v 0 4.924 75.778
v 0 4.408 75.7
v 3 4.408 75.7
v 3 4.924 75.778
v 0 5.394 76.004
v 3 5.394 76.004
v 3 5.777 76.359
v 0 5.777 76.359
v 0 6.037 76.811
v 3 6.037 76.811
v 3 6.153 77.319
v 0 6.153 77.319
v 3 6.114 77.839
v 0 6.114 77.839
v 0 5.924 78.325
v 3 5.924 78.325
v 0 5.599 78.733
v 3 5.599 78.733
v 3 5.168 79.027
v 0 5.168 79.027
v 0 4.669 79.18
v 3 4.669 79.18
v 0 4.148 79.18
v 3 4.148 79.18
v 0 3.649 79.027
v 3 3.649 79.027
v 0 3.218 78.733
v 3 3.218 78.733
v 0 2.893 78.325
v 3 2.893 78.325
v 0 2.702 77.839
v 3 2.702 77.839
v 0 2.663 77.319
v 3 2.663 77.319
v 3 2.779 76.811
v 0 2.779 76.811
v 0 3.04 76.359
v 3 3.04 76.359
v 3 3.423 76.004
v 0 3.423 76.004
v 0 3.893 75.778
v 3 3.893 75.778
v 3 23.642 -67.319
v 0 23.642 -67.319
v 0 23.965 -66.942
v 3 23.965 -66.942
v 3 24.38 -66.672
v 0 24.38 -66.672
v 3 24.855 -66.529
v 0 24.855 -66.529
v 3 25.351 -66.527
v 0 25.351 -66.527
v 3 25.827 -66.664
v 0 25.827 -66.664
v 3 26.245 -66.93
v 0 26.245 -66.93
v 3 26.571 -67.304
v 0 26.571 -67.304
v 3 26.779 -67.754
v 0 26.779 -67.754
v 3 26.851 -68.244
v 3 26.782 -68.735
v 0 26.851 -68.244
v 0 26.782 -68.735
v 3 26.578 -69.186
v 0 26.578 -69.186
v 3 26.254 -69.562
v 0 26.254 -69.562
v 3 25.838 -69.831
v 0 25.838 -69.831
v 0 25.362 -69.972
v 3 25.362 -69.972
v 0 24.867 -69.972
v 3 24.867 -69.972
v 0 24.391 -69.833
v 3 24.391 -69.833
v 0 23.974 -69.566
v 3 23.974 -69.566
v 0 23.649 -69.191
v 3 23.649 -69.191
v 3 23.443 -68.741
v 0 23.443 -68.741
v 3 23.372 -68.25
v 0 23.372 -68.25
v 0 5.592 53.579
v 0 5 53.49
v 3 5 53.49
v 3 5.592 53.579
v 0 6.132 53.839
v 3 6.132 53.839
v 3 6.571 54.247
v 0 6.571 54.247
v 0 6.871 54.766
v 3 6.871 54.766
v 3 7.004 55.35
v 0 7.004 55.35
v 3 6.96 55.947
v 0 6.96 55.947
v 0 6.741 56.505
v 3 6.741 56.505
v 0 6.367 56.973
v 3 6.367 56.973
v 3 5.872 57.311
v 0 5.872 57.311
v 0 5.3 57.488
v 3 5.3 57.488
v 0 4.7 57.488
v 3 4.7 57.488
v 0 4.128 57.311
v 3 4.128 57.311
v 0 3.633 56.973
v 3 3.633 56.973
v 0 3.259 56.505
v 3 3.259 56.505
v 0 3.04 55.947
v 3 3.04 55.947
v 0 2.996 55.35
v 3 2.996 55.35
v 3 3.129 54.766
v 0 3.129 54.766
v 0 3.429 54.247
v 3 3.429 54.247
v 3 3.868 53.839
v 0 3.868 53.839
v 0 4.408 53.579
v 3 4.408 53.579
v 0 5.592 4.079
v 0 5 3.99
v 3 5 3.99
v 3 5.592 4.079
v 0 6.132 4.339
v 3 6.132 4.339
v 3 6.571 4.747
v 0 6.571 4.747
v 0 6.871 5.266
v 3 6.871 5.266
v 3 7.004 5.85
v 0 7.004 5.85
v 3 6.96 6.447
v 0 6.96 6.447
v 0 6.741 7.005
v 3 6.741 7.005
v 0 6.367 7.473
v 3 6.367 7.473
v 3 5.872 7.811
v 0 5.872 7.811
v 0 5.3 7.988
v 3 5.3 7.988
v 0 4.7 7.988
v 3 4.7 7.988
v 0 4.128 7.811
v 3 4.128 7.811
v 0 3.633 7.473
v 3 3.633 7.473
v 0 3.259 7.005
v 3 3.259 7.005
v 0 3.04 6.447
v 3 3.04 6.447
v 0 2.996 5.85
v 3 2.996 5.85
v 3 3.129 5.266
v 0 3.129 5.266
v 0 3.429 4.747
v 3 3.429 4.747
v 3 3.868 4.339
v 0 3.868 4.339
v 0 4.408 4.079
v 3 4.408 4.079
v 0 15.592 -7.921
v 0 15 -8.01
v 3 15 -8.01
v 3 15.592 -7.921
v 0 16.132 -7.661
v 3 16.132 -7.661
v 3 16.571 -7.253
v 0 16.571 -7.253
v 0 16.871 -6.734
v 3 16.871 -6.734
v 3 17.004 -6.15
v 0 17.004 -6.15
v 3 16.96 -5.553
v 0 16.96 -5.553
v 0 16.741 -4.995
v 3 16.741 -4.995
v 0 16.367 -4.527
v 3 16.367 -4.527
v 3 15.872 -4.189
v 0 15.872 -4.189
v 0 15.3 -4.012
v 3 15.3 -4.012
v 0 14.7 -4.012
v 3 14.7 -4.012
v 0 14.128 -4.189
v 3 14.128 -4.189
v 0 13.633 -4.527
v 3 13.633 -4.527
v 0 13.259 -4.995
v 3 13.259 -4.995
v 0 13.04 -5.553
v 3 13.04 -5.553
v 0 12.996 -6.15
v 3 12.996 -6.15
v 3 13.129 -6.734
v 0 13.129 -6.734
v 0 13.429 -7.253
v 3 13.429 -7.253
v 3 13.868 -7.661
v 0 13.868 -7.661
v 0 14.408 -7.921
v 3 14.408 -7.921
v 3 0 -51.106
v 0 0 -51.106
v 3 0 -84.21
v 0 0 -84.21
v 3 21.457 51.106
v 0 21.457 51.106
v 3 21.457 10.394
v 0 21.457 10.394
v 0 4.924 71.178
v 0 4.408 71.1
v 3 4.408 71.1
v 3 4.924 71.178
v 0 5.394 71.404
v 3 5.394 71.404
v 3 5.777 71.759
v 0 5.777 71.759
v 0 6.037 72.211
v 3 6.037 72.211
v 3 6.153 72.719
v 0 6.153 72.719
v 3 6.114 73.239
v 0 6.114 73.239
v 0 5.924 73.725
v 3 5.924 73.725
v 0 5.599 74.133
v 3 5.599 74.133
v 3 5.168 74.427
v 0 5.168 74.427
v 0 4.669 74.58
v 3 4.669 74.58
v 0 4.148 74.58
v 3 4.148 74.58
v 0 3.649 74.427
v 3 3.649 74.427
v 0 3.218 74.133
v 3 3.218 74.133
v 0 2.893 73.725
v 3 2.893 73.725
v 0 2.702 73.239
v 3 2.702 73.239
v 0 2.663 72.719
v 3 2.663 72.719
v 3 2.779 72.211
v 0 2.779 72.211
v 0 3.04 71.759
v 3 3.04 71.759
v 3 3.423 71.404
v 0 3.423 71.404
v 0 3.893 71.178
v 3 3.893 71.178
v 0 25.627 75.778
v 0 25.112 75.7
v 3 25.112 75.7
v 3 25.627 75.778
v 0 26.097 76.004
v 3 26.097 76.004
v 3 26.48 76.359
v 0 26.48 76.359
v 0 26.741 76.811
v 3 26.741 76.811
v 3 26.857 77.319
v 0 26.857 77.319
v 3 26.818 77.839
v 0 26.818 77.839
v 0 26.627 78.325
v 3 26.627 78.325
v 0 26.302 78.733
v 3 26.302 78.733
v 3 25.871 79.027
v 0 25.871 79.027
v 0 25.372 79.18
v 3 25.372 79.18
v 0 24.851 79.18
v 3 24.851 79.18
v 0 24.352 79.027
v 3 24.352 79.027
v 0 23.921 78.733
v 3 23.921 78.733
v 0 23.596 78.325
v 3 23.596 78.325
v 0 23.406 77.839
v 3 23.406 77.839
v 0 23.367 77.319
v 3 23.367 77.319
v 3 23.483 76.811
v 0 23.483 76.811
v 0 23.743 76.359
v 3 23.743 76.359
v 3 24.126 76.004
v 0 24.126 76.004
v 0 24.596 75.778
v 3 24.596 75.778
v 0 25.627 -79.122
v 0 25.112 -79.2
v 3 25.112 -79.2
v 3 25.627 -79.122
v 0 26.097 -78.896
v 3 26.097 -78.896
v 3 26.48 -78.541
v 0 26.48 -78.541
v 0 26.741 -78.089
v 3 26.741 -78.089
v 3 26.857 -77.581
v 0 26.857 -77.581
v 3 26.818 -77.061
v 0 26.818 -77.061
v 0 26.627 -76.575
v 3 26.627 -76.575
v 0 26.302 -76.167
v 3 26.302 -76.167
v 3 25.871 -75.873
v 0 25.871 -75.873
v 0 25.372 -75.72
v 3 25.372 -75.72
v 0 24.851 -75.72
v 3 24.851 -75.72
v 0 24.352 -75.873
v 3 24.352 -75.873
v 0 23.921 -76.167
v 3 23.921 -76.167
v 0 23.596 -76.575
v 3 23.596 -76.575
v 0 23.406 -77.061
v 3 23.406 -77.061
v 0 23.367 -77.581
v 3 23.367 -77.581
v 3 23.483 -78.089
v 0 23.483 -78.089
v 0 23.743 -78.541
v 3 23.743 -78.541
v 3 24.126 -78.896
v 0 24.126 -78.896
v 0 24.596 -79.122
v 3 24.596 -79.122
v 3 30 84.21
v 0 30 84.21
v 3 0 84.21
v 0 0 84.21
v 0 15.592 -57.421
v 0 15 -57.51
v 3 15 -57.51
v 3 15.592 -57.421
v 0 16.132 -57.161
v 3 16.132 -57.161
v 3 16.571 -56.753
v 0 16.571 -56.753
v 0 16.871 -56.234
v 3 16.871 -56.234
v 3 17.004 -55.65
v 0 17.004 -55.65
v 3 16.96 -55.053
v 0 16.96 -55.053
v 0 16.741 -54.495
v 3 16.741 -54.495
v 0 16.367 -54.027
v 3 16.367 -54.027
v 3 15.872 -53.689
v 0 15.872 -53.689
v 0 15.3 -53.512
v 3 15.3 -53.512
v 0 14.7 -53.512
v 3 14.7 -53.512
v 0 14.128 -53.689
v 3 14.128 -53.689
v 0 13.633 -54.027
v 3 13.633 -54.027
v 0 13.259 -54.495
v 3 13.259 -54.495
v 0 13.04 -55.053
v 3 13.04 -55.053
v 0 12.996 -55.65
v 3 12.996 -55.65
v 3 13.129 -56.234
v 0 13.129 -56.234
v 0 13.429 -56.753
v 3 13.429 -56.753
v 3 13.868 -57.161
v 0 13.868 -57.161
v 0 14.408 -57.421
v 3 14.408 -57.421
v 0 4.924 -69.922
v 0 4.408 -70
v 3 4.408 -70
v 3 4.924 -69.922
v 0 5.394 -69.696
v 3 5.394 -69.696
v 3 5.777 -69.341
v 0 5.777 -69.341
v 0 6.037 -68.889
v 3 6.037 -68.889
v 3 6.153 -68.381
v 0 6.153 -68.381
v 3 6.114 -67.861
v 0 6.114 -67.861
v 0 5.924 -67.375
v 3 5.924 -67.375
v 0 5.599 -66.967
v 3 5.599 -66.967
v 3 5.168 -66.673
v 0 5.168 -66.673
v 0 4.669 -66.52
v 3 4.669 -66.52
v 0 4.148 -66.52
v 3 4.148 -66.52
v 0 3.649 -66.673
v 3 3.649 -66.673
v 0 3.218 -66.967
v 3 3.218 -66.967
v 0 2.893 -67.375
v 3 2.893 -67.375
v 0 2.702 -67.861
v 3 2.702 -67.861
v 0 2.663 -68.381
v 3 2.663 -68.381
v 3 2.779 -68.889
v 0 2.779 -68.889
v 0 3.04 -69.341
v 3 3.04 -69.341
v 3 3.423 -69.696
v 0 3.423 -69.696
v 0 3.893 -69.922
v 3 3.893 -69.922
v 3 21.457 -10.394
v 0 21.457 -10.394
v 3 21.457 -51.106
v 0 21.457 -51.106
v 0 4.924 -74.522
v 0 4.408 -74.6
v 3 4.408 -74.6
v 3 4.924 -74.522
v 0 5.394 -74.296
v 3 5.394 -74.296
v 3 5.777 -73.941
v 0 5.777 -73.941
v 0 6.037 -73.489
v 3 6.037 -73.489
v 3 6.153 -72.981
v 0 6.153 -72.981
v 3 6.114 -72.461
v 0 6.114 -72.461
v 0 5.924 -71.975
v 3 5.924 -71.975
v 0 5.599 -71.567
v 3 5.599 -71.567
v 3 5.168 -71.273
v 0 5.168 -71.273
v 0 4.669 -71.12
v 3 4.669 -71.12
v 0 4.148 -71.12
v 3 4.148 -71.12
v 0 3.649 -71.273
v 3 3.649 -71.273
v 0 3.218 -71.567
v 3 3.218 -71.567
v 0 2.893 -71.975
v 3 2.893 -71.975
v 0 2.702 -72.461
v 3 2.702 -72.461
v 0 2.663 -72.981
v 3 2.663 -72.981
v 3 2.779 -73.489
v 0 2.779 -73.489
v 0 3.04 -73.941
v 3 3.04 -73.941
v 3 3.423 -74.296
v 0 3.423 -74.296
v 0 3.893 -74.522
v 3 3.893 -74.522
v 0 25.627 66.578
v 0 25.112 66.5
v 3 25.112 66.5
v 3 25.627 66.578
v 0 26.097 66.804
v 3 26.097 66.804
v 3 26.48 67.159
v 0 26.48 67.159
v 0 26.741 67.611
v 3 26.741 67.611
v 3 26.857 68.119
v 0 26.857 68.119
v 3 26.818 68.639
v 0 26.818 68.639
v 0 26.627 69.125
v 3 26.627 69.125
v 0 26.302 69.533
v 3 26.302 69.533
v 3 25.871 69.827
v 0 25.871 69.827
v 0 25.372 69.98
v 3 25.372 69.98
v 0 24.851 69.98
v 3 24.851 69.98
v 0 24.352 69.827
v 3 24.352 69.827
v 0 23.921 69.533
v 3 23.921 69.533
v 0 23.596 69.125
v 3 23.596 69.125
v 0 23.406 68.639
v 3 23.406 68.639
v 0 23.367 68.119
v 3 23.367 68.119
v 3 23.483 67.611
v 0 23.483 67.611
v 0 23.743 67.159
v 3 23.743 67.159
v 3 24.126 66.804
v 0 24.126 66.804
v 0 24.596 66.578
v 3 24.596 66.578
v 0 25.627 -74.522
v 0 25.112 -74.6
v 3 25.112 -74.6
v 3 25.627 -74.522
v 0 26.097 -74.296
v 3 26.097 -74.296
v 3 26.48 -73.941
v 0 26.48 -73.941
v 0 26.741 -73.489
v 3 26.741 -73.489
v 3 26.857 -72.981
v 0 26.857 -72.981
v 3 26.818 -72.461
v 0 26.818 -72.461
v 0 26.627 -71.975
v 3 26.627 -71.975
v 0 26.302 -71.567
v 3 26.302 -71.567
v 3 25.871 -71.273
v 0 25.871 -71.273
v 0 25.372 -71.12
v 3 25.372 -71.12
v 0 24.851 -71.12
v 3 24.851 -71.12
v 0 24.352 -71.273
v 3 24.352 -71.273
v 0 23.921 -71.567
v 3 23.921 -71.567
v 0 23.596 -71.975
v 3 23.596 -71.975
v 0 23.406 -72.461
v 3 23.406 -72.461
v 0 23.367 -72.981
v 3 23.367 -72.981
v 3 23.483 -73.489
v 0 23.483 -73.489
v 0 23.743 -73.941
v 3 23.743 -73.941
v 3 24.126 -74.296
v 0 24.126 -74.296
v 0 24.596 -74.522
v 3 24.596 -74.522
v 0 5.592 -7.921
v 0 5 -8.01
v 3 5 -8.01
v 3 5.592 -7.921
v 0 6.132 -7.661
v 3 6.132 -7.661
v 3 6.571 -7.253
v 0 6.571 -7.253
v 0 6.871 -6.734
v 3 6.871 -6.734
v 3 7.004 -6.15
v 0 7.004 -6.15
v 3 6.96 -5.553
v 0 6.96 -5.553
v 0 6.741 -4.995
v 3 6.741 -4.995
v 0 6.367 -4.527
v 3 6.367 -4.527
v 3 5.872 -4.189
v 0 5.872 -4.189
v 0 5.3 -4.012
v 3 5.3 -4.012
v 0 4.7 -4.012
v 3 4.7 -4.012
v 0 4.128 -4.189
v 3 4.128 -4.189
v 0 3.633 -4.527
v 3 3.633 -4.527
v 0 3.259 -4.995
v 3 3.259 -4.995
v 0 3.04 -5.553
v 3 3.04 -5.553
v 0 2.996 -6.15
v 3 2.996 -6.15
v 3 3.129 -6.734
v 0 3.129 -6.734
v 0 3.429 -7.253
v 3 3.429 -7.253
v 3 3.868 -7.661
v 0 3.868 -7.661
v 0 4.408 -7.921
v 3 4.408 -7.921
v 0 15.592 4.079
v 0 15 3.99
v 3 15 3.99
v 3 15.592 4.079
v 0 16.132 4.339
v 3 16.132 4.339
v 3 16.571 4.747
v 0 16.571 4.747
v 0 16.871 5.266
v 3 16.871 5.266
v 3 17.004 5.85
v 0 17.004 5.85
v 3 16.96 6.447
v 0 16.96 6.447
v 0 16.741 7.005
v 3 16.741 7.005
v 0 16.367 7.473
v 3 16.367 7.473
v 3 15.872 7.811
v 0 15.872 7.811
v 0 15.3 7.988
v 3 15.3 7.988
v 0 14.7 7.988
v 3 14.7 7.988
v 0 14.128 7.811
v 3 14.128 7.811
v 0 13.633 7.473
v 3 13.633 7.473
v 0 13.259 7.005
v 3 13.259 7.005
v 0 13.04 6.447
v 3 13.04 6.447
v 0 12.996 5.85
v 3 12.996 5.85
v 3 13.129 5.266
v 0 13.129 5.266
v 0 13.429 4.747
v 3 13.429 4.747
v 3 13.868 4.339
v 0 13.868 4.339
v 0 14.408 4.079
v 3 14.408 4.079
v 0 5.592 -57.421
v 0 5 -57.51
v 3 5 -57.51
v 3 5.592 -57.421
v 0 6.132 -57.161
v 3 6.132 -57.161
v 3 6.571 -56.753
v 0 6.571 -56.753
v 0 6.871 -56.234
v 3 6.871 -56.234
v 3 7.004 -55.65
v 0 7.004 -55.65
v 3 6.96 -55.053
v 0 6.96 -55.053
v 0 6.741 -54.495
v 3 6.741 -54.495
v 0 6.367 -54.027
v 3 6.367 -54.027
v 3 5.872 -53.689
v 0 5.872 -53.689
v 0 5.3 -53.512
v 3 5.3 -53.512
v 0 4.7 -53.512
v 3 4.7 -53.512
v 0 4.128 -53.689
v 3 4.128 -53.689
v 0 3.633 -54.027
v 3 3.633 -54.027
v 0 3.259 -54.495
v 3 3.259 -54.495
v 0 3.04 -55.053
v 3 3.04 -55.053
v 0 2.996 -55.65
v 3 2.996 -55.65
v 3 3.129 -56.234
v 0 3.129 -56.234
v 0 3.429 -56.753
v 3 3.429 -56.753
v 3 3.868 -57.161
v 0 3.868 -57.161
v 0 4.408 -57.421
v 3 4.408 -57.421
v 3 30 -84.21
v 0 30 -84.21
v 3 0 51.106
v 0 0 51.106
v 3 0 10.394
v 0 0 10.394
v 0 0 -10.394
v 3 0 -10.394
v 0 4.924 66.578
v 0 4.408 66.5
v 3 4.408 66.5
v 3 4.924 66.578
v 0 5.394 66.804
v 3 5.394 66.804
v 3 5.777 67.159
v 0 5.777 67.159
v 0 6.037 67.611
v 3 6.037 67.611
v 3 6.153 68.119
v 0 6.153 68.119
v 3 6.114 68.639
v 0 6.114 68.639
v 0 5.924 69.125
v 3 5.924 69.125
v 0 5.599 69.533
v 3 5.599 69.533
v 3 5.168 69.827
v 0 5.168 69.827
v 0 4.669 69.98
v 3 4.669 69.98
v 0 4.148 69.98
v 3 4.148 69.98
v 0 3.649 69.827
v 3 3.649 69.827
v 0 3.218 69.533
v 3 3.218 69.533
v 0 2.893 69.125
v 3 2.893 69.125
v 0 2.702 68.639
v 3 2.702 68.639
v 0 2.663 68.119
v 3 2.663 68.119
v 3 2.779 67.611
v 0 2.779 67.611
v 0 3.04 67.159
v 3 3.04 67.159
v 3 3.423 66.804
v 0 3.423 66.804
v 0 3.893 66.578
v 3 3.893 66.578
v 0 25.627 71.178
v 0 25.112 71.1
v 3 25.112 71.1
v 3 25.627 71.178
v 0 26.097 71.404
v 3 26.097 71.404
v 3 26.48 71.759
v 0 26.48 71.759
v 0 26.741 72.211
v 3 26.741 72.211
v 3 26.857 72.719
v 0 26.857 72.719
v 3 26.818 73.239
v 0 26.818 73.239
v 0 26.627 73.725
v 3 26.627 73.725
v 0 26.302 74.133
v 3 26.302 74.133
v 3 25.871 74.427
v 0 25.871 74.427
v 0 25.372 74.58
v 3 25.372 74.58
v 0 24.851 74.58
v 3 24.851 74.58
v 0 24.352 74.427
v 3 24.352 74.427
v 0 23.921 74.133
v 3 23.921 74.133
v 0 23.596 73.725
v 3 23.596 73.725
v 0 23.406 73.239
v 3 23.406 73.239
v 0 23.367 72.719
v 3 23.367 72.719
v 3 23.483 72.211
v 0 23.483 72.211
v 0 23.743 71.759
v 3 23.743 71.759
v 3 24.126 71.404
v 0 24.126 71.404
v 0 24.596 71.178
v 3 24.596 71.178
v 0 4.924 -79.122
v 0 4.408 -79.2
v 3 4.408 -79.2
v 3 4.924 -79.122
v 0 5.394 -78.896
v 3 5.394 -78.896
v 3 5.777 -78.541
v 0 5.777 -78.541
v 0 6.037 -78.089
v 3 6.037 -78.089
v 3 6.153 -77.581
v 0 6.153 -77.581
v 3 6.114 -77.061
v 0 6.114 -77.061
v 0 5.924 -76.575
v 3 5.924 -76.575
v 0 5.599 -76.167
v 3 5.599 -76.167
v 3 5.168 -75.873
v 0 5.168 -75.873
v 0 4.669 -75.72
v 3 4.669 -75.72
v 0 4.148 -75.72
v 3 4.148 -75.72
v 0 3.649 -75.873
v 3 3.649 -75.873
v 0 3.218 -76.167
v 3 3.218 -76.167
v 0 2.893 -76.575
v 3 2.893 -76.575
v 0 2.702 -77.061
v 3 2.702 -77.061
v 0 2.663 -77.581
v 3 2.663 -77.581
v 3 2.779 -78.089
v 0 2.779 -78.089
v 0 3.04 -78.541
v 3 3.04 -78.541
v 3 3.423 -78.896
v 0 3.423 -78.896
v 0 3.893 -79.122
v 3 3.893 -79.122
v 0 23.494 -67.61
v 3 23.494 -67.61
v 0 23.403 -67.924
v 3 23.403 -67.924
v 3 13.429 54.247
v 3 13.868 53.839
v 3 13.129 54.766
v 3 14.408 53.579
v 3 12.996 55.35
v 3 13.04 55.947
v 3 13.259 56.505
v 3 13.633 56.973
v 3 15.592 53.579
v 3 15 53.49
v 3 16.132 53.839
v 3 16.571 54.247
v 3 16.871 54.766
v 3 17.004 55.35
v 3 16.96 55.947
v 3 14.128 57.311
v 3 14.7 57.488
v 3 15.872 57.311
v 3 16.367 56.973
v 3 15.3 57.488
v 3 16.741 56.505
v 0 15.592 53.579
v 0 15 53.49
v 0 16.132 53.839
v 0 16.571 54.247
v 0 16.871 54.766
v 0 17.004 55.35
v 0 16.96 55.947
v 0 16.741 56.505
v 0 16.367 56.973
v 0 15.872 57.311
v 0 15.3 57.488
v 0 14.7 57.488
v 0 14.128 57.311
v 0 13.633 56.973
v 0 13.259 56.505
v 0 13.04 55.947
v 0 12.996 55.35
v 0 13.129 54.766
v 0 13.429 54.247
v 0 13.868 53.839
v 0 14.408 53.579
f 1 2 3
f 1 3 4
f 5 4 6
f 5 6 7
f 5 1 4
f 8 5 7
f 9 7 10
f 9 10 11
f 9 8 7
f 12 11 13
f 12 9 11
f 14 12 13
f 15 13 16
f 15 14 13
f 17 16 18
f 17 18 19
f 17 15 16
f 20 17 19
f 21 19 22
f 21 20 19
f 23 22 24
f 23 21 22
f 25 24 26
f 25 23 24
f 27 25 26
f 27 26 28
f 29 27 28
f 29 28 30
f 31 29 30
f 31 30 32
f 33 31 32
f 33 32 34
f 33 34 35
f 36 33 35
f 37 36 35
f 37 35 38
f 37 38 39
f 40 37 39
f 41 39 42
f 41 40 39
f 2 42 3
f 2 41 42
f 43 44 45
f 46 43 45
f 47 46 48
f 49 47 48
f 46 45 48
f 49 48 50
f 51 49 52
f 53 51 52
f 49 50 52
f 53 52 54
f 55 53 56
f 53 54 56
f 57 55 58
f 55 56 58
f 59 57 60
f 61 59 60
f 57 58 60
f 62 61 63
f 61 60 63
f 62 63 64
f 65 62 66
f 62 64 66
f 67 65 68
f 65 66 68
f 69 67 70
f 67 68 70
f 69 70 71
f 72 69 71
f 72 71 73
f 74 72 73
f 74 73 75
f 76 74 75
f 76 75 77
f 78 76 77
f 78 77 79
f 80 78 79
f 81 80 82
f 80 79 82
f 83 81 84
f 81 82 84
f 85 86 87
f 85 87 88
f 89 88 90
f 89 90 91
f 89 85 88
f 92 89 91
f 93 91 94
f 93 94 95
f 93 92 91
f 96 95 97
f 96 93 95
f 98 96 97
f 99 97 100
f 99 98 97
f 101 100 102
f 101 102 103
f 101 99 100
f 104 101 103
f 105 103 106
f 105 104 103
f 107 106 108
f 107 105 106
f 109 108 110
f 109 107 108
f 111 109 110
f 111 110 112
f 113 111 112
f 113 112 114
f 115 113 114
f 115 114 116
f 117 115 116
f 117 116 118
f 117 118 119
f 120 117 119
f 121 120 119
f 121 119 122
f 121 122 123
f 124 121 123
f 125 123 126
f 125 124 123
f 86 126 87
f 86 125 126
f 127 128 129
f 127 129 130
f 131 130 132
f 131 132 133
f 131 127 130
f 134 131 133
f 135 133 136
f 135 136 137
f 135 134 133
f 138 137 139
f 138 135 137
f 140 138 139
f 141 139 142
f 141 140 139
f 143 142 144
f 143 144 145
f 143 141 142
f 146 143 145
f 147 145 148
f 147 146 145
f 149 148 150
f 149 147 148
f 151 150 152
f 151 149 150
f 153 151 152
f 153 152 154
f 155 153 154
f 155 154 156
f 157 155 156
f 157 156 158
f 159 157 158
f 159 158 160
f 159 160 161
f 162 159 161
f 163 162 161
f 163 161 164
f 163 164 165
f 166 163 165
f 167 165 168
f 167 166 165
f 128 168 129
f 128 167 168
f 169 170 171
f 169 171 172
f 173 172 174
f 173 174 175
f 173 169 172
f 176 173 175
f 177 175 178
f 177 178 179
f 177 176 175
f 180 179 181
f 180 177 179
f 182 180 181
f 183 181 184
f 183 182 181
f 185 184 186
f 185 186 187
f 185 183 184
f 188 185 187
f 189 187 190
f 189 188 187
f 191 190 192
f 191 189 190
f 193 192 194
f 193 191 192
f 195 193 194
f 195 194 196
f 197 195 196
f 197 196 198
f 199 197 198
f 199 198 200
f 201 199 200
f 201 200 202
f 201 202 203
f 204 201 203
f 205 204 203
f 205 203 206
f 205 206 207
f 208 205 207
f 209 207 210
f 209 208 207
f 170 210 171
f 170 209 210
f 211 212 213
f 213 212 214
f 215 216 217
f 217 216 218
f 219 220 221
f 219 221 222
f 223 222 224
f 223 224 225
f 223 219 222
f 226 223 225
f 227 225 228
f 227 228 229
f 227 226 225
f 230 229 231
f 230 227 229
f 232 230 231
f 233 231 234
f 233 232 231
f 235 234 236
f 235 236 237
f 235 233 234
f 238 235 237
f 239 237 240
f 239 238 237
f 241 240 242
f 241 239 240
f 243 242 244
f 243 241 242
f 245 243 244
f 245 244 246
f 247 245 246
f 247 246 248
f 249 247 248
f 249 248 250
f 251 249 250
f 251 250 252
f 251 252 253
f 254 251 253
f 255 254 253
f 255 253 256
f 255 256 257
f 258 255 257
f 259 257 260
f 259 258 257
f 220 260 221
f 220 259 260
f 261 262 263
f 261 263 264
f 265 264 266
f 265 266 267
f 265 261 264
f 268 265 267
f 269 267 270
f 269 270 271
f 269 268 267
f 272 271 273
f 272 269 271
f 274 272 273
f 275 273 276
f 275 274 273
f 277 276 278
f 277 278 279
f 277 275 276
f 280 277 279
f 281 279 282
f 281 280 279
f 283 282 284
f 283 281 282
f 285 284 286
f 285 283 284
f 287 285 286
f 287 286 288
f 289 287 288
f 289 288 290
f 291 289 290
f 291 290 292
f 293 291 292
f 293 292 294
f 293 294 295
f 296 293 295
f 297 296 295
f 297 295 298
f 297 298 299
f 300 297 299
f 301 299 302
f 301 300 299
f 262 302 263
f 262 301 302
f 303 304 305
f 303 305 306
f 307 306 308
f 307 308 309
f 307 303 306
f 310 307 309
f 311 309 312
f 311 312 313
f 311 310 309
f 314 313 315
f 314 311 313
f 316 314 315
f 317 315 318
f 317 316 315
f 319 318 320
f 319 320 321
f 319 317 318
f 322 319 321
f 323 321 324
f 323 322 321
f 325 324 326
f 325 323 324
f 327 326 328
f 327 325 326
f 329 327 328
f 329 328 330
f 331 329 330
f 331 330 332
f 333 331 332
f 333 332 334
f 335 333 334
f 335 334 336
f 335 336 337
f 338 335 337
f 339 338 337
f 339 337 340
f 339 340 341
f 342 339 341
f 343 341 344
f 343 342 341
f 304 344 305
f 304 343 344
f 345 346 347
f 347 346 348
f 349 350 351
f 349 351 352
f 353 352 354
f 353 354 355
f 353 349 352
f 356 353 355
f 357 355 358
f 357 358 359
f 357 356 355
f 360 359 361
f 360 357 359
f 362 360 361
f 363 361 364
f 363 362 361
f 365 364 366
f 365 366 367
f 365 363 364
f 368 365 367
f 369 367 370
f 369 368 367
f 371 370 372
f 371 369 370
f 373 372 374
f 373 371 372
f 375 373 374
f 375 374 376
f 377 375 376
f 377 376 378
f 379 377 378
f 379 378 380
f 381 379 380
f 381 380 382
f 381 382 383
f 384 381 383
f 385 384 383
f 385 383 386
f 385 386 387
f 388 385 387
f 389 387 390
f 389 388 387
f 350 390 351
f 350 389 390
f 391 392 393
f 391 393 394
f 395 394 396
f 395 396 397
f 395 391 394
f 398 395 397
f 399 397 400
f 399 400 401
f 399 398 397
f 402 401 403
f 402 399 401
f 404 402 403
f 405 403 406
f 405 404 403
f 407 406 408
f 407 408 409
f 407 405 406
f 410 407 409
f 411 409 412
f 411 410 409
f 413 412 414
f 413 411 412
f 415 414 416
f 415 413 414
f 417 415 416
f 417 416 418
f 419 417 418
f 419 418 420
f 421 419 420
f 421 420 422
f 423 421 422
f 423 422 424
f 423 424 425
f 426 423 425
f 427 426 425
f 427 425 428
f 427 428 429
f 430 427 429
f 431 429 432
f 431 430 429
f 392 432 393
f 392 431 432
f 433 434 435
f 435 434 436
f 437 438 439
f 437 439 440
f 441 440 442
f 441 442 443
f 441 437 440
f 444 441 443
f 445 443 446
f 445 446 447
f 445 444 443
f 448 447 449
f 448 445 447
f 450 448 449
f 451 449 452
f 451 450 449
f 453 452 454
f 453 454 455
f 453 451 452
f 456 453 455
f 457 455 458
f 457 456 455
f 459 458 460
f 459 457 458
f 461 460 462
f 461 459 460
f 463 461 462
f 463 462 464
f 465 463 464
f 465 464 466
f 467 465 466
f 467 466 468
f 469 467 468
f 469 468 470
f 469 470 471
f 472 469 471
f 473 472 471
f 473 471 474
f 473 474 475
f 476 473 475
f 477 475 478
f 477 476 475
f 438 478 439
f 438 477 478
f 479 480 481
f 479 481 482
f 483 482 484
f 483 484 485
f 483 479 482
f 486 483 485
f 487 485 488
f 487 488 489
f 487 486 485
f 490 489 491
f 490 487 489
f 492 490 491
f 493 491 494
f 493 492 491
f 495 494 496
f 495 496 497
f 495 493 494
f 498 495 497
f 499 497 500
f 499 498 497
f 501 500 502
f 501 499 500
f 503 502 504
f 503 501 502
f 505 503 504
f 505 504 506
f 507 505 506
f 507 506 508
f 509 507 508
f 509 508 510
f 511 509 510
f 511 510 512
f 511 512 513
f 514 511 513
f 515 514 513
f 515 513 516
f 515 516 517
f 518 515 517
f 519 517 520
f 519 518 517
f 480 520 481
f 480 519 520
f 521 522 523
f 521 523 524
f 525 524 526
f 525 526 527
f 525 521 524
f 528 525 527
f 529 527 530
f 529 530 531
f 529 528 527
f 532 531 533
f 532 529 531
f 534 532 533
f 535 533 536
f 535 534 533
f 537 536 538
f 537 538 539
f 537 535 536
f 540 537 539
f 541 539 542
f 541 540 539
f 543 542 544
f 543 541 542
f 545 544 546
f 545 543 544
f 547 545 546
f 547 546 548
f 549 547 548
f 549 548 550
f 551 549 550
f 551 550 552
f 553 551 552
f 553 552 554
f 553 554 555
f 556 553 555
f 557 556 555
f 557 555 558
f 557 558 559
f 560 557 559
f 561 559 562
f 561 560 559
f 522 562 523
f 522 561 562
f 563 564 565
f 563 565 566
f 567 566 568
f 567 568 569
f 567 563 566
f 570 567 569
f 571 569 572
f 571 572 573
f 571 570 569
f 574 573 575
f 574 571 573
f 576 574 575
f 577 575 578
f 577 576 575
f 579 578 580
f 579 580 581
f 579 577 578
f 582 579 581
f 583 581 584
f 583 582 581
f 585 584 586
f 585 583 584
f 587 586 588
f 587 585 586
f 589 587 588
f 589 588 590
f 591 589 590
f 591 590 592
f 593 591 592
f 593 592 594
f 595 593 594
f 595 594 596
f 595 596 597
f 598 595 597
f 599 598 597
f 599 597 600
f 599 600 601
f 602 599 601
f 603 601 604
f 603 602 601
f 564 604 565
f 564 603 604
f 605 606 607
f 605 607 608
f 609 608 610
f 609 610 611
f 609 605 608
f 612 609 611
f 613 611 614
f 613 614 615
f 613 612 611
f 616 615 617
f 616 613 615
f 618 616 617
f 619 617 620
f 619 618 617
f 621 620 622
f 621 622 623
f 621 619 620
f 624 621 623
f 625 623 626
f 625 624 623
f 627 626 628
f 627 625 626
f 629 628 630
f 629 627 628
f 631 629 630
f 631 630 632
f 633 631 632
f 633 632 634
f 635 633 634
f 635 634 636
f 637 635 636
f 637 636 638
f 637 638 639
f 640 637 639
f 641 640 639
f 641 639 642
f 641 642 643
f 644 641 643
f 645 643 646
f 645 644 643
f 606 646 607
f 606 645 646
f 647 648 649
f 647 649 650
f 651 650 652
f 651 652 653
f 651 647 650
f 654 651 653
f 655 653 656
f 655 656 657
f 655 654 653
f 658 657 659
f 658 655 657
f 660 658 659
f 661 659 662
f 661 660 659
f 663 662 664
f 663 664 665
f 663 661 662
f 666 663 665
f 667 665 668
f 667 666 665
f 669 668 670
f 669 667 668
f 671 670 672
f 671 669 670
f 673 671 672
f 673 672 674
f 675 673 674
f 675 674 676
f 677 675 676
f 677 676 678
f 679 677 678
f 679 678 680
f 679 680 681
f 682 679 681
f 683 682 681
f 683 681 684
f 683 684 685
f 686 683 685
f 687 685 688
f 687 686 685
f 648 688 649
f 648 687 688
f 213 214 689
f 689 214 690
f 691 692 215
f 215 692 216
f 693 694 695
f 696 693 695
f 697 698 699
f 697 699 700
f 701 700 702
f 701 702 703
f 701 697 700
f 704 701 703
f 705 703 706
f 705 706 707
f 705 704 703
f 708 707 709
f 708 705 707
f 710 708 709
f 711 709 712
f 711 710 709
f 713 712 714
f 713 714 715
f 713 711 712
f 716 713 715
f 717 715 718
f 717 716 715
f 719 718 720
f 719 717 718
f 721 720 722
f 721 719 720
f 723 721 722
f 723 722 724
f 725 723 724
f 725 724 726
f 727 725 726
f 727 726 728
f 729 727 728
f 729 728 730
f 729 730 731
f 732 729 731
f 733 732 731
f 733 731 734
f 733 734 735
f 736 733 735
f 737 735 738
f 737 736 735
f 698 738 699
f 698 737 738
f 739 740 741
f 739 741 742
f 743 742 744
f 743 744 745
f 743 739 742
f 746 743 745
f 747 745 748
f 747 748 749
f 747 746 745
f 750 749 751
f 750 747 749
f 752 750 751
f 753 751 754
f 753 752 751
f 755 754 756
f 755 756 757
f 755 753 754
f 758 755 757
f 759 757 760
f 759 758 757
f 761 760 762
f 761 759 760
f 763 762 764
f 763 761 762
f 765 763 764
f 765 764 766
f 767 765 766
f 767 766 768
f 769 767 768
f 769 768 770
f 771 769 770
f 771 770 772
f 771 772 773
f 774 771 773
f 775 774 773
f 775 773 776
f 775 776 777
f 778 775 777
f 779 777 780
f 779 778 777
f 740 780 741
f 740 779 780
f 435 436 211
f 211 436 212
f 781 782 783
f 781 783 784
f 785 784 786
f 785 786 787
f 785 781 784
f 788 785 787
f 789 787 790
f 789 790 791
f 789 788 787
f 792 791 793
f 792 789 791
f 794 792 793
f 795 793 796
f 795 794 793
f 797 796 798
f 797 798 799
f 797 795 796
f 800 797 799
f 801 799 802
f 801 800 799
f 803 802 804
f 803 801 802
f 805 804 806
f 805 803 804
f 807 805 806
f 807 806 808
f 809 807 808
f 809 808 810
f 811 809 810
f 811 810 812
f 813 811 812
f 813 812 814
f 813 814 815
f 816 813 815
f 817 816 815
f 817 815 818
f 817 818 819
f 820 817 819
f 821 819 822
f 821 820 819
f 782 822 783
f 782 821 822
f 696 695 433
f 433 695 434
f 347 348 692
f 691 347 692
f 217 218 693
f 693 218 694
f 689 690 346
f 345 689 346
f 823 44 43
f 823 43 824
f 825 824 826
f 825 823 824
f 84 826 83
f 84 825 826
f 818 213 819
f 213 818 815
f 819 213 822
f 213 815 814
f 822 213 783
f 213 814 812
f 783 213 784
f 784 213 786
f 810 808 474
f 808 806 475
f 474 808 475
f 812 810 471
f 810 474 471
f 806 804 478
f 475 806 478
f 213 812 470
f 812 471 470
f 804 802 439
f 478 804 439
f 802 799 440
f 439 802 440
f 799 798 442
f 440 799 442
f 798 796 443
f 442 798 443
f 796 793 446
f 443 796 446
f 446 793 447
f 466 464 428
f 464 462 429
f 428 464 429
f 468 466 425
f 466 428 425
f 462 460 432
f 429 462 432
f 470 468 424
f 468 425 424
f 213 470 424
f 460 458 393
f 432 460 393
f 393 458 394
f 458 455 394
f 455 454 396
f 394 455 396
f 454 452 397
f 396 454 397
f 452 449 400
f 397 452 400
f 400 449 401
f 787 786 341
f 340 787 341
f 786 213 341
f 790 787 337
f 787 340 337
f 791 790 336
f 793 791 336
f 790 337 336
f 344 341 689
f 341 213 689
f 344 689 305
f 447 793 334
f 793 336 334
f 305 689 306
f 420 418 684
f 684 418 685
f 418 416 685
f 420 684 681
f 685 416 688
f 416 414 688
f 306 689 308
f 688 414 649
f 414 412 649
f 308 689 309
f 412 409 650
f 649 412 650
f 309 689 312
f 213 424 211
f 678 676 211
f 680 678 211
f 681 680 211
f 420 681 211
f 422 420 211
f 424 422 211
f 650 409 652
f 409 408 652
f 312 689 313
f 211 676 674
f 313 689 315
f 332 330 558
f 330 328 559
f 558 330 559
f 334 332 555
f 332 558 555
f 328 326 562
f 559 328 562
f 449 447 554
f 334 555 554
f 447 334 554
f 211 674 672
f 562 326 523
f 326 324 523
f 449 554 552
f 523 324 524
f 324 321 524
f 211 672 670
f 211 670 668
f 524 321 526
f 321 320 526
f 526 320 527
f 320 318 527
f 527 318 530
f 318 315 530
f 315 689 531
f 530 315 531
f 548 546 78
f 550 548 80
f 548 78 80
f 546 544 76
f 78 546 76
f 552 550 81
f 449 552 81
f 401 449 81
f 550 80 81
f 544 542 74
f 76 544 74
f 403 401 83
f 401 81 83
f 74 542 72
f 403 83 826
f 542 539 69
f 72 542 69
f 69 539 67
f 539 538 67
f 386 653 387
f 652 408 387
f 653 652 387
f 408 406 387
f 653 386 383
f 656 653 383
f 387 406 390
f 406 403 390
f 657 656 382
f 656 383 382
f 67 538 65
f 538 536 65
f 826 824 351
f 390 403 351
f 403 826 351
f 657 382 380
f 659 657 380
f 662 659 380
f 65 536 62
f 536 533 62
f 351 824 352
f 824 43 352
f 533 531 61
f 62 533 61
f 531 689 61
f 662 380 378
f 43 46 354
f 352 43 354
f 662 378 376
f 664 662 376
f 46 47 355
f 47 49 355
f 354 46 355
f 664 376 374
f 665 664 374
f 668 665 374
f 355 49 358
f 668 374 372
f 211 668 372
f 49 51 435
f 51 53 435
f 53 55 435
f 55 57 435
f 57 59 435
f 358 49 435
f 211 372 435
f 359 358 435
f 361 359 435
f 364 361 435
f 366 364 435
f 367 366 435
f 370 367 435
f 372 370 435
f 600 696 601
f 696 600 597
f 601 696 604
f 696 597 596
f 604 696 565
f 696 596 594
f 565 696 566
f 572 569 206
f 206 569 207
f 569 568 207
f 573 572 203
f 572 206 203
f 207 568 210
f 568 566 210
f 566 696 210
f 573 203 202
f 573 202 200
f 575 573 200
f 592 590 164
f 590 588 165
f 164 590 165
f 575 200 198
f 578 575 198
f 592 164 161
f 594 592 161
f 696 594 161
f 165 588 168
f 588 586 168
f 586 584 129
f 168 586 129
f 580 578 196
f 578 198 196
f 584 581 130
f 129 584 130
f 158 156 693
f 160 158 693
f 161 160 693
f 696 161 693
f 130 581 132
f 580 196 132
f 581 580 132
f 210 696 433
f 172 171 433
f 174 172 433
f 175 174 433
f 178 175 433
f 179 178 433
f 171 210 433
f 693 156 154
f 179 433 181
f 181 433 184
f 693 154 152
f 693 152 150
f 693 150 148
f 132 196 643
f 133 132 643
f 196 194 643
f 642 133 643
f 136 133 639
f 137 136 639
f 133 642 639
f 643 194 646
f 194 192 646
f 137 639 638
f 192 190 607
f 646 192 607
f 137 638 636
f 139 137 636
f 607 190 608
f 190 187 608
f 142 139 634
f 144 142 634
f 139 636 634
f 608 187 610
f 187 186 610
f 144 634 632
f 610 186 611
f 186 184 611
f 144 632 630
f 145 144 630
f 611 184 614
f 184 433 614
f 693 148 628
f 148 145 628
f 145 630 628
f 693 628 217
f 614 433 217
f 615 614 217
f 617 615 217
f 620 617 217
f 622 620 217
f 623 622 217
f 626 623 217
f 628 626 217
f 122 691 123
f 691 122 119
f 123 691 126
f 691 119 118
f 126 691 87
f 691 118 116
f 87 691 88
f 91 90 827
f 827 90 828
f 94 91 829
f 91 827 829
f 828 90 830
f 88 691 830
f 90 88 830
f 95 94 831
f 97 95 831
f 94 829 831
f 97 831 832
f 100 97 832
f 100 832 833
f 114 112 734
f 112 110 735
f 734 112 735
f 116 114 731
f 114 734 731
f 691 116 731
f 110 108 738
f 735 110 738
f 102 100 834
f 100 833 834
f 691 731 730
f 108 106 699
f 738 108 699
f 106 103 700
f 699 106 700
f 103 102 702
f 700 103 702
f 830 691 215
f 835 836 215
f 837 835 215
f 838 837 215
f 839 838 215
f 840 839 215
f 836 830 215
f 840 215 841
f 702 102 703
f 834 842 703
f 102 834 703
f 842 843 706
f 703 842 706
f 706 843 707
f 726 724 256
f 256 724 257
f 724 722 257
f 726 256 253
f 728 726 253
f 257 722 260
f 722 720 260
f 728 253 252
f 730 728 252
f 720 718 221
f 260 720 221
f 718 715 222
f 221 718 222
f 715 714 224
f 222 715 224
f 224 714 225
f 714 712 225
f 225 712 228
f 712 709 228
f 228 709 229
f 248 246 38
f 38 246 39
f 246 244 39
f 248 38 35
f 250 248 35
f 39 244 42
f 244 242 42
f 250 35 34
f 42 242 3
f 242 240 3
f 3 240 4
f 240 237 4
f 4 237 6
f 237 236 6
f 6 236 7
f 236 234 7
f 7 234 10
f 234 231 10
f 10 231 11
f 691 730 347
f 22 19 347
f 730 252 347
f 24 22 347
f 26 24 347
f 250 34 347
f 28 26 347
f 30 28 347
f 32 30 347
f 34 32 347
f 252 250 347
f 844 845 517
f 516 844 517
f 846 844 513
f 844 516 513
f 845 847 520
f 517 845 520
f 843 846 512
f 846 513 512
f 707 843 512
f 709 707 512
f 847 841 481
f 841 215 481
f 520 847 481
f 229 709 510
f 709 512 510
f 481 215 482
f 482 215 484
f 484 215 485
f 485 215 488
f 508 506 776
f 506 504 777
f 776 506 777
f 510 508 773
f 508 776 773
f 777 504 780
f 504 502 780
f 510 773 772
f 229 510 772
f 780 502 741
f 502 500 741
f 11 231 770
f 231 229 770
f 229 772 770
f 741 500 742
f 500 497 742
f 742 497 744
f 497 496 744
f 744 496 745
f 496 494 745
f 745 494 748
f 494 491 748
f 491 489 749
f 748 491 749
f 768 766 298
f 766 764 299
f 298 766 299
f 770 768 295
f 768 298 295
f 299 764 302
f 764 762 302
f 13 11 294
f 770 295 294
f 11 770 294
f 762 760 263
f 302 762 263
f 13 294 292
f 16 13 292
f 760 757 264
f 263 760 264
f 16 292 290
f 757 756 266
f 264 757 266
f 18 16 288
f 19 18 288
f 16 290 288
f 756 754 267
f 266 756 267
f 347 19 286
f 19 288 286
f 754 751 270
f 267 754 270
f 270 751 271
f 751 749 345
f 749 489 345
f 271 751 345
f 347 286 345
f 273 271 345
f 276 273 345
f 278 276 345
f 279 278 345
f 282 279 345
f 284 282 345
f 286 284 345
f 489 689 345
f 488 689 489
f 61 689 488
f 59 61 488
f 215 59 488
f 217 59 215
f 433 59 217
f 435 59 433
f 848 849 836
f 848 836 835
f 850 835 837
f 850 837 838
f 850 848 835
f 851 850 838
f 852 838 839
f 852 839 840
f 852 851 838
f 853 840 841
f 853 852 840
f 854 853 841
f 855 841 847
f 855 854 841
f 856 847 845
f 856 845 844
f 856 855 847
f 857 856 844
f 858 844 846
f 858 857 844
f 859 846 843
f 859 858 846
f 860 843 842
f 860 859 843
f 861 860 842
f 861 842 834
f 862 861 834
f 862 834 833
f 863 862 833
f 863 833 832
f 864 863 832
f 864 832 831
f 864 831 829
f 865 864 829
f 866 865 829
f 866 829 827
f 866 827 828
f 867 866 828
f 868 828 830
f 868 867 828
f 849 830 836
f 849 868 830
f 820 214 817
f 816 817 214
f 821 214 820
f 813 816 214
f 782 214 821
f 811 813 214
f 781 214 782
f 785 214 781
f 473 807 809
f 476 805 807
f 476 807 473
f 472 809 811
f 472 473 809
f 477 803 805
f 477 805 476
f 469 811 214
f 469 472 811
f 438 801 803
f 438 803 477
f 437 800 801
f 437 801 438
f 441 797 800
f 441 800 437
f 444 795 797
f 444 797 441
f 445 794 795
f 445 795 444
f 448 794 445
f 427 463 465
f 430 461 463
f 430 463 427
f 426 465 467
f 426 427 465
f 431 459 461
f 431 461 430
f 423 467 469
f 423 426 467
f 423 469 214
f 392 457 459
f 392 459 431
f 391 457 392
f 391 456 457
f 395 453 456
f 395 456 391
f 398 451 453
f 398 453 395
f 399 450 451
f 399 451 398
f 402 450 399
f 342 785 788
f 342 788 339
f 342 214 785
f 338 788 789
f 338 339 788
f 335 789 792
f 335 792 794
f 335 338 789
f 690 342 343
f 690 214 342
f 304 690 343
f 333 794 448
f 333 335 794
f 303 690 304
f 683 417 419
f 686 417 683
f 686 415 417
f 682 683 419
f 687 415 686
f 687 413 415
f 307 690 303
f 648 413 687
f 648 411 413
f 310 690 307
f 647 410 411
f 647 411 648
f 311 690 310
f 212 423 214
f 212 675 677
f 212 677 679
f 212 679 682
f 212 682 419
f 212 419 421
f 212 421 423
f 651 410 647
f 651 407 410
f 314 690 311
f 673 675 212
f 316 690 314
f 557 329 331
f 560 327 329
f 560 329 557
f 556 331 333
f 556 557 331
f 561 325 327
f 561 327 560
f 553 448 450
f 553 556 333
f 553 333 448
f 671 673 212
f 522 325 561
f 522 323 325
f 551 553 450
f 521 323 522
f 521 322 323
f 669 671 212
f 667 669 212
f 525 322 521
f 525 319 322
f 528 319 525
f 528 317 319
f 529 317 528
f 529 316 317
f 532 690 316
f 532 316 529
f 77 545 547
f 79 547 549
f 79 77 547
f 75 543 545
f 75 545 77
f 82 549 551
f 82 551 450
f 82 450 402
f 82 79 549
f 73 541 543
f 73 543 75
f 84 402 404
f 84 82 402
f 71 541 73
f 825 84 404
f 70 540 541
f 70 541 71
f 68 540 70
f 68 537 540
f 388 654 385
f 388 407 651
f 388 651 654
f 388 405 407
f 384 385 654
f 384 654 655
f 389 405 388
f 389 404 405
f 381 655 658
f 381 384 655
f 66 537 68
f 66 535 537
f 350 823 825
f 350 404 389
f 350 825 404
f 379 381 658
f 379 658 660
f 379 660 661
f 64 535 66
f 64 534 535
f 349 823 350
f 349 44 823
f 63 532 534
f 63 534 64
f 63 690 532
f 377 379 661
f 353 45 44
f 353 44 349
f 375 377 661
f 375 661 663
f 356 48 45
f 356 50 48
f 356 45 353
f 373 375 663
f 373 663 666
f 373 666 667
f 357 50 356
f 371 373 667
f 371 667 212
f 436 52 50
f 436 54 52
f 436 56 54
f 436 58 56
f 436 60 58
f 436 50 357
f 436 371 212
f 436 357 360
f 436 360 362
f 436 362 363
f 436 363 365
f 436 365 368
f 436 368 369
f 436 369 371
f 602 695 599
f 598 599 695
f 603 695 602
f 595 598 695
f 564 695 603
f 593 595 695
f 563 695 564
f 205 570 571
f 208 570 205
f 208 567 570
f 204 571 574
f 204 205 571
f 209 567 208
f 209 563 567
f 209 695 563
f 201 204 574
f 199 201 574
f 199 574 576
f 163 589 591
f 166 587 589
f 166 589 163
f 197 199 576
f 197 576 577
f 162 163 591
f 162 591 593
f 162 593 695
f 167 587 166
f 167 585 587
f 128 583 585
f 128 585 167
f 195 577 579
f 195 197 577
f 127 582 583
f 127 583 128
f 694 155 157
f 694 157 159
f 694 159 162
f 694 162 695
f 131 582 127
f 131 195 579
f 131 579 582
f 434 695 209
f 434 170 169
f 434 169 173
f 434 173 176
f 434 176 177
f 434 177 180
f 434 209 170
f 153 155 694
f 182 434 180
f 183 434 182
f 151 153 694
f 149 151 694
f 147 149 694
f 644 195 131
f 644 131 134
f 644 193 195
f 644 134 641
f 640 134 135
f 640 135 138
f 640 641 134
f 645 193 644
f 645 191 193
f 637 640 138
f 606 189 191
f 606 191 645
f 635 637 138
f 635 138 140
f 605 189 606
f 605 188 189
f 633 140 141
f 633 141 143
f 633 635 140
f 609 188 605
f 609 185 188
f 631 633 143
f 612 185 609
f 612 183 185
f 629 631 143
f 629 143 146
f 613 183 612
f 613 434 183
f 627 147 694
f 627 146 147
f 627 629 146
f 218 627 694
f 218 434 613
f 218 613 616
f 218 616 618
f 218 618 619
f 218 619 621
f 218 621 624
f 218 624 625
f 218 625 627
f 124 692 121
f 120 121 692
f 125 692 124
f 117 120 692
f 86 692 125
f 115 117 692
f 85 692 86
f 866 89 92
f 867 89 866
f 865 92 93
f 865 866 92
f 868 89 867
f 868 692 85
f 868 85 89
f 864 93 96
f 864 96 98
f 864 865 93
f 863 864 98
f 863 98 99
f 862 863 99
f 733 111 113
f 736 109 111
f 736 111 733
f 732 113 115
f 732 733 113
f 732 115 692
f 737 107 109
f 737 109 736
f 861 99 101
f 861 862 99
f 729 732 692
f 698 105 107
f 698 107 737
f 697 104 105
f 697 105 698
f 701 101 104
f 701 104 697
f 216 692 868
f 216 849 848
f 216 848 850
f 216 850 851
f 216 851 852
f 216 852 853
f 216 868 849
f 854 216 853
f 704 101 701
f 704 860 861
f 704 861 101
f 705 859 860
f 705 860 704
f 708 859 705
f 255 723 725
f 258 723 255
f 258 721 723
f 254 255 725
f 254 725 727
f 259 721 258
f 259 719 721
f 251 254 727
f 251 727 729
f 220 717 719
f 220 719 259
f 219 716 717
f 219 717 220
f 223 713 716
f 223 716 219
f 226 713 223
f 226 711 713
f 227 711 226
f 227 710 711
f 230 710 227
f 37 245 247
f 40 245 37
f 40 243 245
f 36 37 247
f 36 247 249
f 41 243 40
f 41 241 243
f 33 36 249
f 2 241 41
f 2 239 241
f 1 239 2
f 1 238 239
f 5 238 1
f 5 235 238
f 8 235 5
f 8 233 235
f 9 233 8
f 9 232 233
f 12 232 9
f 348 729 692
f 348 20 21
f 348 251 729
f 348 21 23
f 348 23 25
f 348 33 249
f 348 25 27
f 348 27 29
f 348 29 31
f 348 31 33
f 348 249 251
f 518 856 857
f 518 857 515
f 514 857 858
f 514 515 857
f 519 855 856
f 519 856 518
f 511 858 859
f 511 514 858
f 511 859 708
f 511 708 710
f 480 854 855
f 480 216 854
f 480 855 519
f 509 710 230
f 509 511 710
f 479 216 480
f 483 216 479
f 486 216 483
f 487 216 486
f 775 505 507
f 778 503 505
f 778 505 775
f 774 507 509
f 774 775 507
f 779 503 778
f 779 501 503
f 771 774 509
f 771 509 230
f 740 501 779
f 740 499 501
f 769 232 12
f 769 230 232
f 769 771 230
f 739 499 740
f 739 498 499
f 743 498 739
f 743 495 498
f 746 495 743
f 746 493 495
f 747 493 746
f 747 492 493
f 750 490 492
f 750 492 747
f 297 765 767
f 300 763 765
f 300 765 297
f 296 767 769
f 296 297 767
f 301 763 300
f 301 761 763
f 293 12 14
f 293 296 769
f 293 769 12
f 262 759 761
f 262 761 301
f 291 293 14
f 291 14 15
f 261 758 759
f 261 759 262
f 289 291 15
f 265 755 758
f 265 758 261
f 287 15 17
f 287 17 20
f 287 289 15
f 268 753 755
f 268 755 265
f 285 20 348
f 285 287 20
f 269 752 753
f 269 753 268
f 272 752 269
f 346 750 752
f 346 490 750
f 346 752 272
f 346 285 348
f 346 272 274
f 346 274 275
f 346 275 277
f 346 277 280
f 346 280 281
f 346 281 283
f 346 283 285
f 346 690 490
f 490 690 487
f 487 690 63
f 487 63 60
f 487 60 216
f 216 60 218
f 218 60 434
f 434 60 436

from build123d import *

# Parameters (mm, degrees)
SKETCH1_R           = 2.01
SKETCH1_R_2         = 1.75
BOSS_EXTRUDE1_DEPTH = 3
BOSS_EXTRUDE2_DEPTH = 3


with BuildPart() as part:
    # Sketch1 → Boss-Extrude1 (new body)
    with BuildSketch(Plane(origin=(0, 0, 0), x_dir=(0, 0, -1), z_dir=(1, 0, 0))):
        Polygon((51.106463596, 21.456503046), (51.106463596, 0), (84.21, 0), (84.21, 30), (-84.21, 30), (-84.21, 0), (-51.106463596, 0), (-51.106463596, 21.456503046), (-10.393536404, 21.456503046), (-10.393536404, 0), (10.393536404, 0), (10.393536404, 21.456503046), align=None)
        with Locations((55.5, 15)):
            Circle(SKETCH1_R, mode=Mode.SUBTRACT)
        with Locations((55.5, 5)):
            Circle(SKETCH1_R, mode=Mode.SUBTRACT)
        with Locations((-77.45, 4.408333333)):
            Circle(SKETCH1_R_2, mode=Mode.SUBTRACT)
        with Locations((-72.85, 4.408333333)):
            Circle(SKETCH1_R_2, mode=Mode.SUBTRACT)
        with Locations((-68.25, 4.408333333)):
            Circle(SKETCH1_R_2, mode=Mode.SUBTRACT)
        with Locations((-55.5, 5)):
            Circle(SKETCH1_R, mode=Mode.SUBTRACT)
        with Locations((-6, 5)):
            Circle(SKETCH1_R, mode=Mode.SUBTRACT)
        with Locations((6, 5)):
            Circle(SKETCH1_R, mode=Mode.SUBTRACT)
        with Locations((68.25, 4.408333333)):
            Circle(SKETCH1_R_2, mode=Mode.SUBTRACT)
        with Locations((-55.5, 15)):
            Circle(SKETCH1_R, mode=Mode.SUBTRACT)
        with Locations((-6, 15)):
            Circle(SKETCH1_R, mode=Mode.SUBTRACT)
        with Locations((-77.45, 25.111666667)):
            Circle(SKETCH1_R_2, mode=Mode.SUBTRACT)
        with Locations((-72.85, 25.111666667)):
            Circle(SKETCH1_R_2, mode=Mode.SUBTRACT)
        with Locations((-68.25, 25.111666667)):
            Circle(SKETCH1_R_2, mode=Mode.SUBTRACT)
        with Locations((6, 15)):
            Circle(SKETCH1_R, mode=Mode.SUBTRACT)
        with Locations((77.45, 25.111666667)):
            Circle(SKETCH1_R_2, mode=Mode.SUBTRACT)
        with Locations((77.45, 4.408333333)):
            Circle(SKETCH1_R_2, mode=Mode.SUBTRACT)
        with Locations((72.85, 4.408333333)):
            Circle(SKETCH1_R_2, mode=Mode.SUBTRACT)
        with Locations((72.85, 25.111666667)):
            Circle(SKETCH1_R_2, mode=Mode.SUBTRACT)
        with BuildLine():
            Line((68.25, 23.119646681), (66.786206896, 22.802700472))
            Line((66.786206896, 22.802700472), (67.318515469, 23.642356362))
            ThreePointArc((67.318515469, 23.642356362), (68.734966733, 26.782398085), (68.25, 23.371972382))
            Line((68.25, 23.371972382), (68.25, 23.119646681))
        make_face(mode=Mode.SUBTRACT)
    extrude(amount=BOSS_EXTRUDE1_DEPTH)

    # Sketch2 → Boss-Extrude2 (add)
    with BuildSketch(Plane.ZY):
        with BuildLine():
            Line((-68.25, 23.371972382), (-68.25, 23.119646681))
            Line((-68.25, 23.119646681), (-66.825746374, 22.811261715))
            Line((-66.825746374, 22.811261715), (-66.786206896, 22.802700472))
            Line((-66.786206896, 22.802700472), (-67.318515469, 23.642356362))
            ThreePointArc((-67.318515469, 23.642356362), (-67.765033267, 23.440935248), (-68.25, 23.371972382))
        make_face()
    extrude(amount=-BOSS_EXTRUDE2_DEPTH)


solid = part.part
